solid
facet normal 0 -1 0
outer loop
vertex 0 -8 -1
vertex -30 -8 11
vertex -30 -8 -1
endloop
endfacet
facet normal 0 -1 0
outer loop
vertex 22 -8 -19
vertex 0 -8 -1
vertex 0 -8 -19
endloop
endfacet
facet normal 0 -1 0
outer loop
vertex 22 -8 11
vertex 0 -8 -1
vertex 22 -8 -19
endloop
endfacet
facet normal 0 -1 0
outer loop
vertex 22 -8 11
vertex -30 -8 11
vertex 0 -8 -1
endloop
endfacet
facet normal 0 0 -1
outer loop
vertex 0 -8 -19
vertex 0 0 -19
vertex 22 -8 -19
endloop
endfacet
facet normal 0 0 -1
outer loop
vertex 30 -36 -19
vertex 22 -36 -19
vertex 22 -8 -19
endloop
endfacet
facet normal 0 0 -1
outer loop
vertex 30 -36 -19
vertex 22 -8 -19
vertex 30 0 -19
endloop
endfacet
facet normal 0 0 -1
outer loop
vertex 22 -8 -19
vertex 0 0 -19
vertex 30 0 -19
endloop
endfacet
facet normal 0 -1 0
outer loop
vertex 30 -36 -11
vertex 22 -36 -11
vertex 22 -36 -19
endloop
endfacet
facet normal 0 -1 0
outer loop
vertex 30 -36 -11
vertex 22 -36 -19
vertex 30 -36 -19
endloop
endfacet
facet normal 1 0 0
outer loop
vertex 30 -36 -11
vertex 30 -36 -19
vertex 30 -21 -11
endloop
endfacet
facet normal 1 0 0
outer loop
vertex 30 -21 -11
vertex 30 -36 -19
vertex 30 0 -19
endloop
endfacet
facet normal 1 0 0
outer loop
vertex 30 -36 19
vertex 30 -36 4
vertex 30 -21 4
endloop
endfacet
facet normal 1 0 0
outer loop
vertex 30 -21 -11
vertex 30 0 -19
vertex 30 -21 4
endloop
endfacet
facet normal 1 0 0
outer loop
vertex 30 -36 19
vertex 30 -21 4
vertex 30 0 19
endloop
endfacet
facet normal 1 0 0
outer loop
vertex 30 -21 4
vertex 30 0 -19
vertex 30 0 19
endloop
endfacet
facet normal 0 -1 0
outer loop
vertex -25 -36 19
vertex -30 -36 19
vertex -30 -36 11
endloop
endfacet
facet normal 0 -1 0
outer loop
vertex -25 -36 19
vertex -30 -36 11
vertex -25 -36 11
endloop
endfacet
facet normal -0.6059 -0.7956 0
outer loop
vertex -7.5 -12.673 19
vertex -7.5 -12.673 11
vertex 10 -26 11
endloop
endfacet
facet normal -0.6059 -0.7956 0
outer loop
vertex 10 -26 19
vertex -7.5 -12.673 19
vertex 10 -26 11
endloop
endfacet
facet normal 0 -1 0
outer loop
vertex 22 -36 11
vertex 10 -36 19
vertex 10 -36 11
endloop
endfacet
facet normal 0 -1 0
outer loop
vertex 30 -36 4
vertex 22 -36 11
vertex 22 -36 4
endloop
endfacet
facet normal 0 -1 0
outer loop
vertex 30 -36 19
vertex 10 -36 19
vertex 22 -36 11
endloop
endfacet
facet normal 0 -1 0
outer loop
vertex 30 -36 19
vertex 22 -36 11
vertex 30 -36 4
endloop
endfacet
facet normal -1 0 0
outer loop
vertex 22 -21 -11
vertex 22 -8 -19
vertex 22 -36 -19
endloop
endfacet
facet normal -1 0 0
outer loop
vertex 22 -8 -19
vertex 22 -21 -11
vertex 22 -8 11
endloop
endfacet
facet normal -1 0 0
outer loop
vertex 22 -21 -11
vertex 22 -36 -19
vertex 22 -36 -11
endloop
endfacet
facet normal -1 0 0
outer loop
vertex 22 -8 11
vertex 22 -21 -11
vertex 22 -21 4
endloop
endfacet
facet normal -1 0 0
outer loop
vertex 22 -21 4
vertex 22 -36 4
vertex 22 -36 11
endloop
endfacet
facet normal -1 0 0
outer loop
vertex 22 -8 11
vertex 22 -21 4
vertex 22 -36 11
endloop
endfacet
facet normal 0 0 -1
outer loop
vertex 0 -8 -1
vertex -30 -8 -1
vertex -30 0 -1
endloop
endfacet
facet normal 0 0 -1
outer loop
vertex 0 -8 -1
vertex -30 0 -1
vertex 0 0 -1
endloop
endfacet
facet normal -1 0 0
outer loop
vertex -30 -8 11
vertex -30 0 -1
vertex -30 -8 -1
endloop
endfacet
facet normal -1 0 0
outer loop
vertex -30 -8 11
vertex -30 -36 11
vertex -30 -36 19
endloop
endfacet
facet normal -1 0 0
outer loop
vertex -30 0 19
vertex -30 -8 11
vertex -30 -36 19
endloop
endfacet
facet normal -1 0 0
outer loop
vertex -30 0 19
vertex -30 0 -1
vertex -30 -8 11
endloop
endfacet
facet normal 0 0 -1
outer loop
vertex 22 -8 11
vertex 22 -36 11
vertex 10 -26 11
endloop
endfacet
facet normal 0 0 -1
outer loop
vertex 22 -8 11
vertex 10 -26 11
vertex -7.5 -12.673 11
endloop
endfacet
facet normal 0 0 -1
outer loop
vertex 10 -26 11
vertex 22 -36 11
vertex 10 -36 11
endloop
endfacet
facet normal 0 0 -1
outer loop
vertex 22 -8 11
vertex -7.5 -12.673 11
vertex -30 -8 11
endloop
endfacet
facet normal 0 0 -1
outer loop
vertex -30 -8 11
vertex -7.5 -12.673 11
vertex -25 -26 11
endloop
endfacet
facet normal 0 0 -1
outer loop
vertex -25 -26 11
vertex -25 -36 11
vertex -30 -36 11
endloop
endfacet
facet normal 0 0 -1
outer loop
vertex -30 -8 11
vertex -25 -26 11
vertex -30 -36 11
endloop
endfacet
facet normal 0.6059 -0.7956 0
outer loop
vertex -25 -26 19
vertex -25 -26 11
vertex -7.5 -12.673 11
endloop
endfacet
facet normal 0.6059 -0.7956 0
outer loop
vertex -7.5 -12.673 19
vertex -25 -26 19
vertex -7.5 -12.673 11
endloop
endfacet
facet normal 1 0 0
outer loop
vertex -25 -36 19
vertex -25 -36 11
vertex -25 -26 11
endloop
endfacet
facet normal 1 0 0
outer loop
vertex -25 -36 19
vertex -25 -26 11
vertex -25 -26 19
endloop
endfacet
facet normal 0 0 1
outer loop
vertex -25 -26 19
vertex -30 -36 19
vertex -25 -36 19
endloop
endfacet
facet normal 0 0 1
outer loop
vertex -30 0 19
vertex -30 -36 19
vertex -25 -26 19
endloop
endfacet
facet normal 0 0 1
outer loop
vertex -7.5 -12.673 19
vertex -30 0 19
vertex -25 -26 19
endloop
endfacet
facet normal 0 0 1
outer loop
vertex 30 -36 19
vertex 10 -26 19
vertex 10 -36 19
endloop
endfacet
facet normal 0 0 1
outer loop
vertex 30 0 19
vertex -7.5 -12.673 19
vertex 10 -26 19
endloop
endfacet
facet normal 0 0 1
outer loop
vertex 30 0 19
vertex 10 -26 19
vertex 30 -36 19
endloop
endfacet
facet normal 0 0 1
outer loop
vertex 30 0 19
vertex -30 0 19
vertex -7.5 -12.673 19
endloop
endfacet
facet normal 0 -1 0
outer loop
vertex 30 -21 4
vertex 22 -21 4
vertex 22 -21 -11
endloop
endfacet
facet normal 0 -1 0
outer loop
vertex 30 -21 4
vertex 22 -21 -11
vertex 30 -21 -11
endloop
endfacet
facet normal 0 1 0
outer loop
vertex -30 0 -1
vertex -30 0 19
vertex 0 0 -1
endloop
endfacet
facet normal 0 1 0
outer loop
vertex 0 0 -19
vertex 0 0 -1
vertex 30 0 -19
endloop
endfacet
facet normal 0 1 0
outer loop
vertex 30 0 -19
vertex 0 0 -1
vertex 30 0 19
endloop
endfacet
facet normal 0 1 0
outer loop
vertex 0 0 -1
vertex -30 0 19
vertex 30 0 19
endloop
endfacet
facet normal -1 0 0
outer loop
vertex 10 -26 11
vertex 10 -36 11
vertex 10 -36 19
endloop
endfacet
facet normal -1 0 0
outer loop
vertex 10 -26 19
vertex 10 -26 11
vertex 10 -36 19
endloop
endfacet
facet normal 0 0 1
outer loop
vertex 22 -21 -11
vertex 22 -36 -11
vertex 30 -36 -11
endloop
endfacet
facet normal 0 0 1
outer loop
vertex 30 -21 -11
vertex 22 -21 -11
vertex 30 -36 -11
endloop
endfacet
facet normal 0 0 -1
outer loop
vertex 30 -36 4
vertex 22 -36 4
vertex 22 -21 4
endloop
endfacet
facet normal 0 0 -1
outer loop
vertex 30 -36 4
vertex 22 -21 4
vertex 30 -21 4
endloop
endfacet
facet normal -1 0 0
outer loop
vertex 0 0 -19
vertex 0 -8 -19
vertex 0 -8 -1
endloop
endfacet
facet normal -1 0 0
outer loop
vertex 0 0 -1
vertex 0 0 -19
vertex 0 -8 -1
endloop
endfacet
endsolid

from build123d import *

# Parameters (mm, degrees)
F0_W     = 60
F0_H     = 38
F1_DEPTH = 36
F2_W     = 8
F2_H     = 15
F3_DEPTH = 15
F4_DEPTH = 28
F2_W_2   = 30
F2_H_2   = 18
F5_DEPTH = 36.001
F2_W_3   = 35
F2_H_3   = 8
F6_DEPTH = 10
F8_DEPTH = 8.001


with BuildPart() as f1:
    # F0 (on Front) → F1 (new body)
    with BuildSketch(Plane.XZ):
        Rectangle(F0_W, F0_H)
    extrude(amount=F1_DEPTH)

    # F2 (on face) → F3 (cut)
    with BuildSketch(Plane.XZ.offset(36)):
        with Locations((26, -3.5)):
            Rectangle(F2_W, F2_H)
    extrude(amount=-F3_DEPTH, mode=Mode.SUBTRACT)

    # F2 (on face) → F4 (cut)
    with BuildSketch(Plane.XZ.offset(36)):
        Polygon((0, -19), (22, -19), (22, -11), (22, 4), (22, 11), (10, 11), (-25, 11), (-30, 11), (-30, -1), (0, -1), align=None)
    extrude(amount=-F4_DEPTH, mode=Mode.SUBTRACT)

    # F2 (on face) → F5 (cut, through all)
    with BuildSketch(Plane.XZ.offset(36)):
        with Locations((-15, -10)):
            Rectangle(F2_W_2, F2_H_2)
    extrude(amount=-F5_DEPTH, mode=Mode.SUBTRACT)

    # F2 (on face) → F6 (cut)
    with BuildSketch(Plane.XZ.offset(36)):
        with Locations((-7.5, 15)):
            Rectangle(F2_W_3, F2_H_3)
    extrude(amount=-F6_DEPTH, mode=Mode.SUBTRACT)

    # F7 (on face) → F8 (cut, through all)
    with BuildSketch(Plane(origin=(0, 0, 11), x_dir=(1, 0, 0), z_dir=(0, 0, -1))):
        Polygon((-25, 26), (-7.5, 12.67333), (10, 26), align=None)
    extrude(amount=-F8_DEPTH, mode=Mode.SUBTRACT)


solid = f1.part
